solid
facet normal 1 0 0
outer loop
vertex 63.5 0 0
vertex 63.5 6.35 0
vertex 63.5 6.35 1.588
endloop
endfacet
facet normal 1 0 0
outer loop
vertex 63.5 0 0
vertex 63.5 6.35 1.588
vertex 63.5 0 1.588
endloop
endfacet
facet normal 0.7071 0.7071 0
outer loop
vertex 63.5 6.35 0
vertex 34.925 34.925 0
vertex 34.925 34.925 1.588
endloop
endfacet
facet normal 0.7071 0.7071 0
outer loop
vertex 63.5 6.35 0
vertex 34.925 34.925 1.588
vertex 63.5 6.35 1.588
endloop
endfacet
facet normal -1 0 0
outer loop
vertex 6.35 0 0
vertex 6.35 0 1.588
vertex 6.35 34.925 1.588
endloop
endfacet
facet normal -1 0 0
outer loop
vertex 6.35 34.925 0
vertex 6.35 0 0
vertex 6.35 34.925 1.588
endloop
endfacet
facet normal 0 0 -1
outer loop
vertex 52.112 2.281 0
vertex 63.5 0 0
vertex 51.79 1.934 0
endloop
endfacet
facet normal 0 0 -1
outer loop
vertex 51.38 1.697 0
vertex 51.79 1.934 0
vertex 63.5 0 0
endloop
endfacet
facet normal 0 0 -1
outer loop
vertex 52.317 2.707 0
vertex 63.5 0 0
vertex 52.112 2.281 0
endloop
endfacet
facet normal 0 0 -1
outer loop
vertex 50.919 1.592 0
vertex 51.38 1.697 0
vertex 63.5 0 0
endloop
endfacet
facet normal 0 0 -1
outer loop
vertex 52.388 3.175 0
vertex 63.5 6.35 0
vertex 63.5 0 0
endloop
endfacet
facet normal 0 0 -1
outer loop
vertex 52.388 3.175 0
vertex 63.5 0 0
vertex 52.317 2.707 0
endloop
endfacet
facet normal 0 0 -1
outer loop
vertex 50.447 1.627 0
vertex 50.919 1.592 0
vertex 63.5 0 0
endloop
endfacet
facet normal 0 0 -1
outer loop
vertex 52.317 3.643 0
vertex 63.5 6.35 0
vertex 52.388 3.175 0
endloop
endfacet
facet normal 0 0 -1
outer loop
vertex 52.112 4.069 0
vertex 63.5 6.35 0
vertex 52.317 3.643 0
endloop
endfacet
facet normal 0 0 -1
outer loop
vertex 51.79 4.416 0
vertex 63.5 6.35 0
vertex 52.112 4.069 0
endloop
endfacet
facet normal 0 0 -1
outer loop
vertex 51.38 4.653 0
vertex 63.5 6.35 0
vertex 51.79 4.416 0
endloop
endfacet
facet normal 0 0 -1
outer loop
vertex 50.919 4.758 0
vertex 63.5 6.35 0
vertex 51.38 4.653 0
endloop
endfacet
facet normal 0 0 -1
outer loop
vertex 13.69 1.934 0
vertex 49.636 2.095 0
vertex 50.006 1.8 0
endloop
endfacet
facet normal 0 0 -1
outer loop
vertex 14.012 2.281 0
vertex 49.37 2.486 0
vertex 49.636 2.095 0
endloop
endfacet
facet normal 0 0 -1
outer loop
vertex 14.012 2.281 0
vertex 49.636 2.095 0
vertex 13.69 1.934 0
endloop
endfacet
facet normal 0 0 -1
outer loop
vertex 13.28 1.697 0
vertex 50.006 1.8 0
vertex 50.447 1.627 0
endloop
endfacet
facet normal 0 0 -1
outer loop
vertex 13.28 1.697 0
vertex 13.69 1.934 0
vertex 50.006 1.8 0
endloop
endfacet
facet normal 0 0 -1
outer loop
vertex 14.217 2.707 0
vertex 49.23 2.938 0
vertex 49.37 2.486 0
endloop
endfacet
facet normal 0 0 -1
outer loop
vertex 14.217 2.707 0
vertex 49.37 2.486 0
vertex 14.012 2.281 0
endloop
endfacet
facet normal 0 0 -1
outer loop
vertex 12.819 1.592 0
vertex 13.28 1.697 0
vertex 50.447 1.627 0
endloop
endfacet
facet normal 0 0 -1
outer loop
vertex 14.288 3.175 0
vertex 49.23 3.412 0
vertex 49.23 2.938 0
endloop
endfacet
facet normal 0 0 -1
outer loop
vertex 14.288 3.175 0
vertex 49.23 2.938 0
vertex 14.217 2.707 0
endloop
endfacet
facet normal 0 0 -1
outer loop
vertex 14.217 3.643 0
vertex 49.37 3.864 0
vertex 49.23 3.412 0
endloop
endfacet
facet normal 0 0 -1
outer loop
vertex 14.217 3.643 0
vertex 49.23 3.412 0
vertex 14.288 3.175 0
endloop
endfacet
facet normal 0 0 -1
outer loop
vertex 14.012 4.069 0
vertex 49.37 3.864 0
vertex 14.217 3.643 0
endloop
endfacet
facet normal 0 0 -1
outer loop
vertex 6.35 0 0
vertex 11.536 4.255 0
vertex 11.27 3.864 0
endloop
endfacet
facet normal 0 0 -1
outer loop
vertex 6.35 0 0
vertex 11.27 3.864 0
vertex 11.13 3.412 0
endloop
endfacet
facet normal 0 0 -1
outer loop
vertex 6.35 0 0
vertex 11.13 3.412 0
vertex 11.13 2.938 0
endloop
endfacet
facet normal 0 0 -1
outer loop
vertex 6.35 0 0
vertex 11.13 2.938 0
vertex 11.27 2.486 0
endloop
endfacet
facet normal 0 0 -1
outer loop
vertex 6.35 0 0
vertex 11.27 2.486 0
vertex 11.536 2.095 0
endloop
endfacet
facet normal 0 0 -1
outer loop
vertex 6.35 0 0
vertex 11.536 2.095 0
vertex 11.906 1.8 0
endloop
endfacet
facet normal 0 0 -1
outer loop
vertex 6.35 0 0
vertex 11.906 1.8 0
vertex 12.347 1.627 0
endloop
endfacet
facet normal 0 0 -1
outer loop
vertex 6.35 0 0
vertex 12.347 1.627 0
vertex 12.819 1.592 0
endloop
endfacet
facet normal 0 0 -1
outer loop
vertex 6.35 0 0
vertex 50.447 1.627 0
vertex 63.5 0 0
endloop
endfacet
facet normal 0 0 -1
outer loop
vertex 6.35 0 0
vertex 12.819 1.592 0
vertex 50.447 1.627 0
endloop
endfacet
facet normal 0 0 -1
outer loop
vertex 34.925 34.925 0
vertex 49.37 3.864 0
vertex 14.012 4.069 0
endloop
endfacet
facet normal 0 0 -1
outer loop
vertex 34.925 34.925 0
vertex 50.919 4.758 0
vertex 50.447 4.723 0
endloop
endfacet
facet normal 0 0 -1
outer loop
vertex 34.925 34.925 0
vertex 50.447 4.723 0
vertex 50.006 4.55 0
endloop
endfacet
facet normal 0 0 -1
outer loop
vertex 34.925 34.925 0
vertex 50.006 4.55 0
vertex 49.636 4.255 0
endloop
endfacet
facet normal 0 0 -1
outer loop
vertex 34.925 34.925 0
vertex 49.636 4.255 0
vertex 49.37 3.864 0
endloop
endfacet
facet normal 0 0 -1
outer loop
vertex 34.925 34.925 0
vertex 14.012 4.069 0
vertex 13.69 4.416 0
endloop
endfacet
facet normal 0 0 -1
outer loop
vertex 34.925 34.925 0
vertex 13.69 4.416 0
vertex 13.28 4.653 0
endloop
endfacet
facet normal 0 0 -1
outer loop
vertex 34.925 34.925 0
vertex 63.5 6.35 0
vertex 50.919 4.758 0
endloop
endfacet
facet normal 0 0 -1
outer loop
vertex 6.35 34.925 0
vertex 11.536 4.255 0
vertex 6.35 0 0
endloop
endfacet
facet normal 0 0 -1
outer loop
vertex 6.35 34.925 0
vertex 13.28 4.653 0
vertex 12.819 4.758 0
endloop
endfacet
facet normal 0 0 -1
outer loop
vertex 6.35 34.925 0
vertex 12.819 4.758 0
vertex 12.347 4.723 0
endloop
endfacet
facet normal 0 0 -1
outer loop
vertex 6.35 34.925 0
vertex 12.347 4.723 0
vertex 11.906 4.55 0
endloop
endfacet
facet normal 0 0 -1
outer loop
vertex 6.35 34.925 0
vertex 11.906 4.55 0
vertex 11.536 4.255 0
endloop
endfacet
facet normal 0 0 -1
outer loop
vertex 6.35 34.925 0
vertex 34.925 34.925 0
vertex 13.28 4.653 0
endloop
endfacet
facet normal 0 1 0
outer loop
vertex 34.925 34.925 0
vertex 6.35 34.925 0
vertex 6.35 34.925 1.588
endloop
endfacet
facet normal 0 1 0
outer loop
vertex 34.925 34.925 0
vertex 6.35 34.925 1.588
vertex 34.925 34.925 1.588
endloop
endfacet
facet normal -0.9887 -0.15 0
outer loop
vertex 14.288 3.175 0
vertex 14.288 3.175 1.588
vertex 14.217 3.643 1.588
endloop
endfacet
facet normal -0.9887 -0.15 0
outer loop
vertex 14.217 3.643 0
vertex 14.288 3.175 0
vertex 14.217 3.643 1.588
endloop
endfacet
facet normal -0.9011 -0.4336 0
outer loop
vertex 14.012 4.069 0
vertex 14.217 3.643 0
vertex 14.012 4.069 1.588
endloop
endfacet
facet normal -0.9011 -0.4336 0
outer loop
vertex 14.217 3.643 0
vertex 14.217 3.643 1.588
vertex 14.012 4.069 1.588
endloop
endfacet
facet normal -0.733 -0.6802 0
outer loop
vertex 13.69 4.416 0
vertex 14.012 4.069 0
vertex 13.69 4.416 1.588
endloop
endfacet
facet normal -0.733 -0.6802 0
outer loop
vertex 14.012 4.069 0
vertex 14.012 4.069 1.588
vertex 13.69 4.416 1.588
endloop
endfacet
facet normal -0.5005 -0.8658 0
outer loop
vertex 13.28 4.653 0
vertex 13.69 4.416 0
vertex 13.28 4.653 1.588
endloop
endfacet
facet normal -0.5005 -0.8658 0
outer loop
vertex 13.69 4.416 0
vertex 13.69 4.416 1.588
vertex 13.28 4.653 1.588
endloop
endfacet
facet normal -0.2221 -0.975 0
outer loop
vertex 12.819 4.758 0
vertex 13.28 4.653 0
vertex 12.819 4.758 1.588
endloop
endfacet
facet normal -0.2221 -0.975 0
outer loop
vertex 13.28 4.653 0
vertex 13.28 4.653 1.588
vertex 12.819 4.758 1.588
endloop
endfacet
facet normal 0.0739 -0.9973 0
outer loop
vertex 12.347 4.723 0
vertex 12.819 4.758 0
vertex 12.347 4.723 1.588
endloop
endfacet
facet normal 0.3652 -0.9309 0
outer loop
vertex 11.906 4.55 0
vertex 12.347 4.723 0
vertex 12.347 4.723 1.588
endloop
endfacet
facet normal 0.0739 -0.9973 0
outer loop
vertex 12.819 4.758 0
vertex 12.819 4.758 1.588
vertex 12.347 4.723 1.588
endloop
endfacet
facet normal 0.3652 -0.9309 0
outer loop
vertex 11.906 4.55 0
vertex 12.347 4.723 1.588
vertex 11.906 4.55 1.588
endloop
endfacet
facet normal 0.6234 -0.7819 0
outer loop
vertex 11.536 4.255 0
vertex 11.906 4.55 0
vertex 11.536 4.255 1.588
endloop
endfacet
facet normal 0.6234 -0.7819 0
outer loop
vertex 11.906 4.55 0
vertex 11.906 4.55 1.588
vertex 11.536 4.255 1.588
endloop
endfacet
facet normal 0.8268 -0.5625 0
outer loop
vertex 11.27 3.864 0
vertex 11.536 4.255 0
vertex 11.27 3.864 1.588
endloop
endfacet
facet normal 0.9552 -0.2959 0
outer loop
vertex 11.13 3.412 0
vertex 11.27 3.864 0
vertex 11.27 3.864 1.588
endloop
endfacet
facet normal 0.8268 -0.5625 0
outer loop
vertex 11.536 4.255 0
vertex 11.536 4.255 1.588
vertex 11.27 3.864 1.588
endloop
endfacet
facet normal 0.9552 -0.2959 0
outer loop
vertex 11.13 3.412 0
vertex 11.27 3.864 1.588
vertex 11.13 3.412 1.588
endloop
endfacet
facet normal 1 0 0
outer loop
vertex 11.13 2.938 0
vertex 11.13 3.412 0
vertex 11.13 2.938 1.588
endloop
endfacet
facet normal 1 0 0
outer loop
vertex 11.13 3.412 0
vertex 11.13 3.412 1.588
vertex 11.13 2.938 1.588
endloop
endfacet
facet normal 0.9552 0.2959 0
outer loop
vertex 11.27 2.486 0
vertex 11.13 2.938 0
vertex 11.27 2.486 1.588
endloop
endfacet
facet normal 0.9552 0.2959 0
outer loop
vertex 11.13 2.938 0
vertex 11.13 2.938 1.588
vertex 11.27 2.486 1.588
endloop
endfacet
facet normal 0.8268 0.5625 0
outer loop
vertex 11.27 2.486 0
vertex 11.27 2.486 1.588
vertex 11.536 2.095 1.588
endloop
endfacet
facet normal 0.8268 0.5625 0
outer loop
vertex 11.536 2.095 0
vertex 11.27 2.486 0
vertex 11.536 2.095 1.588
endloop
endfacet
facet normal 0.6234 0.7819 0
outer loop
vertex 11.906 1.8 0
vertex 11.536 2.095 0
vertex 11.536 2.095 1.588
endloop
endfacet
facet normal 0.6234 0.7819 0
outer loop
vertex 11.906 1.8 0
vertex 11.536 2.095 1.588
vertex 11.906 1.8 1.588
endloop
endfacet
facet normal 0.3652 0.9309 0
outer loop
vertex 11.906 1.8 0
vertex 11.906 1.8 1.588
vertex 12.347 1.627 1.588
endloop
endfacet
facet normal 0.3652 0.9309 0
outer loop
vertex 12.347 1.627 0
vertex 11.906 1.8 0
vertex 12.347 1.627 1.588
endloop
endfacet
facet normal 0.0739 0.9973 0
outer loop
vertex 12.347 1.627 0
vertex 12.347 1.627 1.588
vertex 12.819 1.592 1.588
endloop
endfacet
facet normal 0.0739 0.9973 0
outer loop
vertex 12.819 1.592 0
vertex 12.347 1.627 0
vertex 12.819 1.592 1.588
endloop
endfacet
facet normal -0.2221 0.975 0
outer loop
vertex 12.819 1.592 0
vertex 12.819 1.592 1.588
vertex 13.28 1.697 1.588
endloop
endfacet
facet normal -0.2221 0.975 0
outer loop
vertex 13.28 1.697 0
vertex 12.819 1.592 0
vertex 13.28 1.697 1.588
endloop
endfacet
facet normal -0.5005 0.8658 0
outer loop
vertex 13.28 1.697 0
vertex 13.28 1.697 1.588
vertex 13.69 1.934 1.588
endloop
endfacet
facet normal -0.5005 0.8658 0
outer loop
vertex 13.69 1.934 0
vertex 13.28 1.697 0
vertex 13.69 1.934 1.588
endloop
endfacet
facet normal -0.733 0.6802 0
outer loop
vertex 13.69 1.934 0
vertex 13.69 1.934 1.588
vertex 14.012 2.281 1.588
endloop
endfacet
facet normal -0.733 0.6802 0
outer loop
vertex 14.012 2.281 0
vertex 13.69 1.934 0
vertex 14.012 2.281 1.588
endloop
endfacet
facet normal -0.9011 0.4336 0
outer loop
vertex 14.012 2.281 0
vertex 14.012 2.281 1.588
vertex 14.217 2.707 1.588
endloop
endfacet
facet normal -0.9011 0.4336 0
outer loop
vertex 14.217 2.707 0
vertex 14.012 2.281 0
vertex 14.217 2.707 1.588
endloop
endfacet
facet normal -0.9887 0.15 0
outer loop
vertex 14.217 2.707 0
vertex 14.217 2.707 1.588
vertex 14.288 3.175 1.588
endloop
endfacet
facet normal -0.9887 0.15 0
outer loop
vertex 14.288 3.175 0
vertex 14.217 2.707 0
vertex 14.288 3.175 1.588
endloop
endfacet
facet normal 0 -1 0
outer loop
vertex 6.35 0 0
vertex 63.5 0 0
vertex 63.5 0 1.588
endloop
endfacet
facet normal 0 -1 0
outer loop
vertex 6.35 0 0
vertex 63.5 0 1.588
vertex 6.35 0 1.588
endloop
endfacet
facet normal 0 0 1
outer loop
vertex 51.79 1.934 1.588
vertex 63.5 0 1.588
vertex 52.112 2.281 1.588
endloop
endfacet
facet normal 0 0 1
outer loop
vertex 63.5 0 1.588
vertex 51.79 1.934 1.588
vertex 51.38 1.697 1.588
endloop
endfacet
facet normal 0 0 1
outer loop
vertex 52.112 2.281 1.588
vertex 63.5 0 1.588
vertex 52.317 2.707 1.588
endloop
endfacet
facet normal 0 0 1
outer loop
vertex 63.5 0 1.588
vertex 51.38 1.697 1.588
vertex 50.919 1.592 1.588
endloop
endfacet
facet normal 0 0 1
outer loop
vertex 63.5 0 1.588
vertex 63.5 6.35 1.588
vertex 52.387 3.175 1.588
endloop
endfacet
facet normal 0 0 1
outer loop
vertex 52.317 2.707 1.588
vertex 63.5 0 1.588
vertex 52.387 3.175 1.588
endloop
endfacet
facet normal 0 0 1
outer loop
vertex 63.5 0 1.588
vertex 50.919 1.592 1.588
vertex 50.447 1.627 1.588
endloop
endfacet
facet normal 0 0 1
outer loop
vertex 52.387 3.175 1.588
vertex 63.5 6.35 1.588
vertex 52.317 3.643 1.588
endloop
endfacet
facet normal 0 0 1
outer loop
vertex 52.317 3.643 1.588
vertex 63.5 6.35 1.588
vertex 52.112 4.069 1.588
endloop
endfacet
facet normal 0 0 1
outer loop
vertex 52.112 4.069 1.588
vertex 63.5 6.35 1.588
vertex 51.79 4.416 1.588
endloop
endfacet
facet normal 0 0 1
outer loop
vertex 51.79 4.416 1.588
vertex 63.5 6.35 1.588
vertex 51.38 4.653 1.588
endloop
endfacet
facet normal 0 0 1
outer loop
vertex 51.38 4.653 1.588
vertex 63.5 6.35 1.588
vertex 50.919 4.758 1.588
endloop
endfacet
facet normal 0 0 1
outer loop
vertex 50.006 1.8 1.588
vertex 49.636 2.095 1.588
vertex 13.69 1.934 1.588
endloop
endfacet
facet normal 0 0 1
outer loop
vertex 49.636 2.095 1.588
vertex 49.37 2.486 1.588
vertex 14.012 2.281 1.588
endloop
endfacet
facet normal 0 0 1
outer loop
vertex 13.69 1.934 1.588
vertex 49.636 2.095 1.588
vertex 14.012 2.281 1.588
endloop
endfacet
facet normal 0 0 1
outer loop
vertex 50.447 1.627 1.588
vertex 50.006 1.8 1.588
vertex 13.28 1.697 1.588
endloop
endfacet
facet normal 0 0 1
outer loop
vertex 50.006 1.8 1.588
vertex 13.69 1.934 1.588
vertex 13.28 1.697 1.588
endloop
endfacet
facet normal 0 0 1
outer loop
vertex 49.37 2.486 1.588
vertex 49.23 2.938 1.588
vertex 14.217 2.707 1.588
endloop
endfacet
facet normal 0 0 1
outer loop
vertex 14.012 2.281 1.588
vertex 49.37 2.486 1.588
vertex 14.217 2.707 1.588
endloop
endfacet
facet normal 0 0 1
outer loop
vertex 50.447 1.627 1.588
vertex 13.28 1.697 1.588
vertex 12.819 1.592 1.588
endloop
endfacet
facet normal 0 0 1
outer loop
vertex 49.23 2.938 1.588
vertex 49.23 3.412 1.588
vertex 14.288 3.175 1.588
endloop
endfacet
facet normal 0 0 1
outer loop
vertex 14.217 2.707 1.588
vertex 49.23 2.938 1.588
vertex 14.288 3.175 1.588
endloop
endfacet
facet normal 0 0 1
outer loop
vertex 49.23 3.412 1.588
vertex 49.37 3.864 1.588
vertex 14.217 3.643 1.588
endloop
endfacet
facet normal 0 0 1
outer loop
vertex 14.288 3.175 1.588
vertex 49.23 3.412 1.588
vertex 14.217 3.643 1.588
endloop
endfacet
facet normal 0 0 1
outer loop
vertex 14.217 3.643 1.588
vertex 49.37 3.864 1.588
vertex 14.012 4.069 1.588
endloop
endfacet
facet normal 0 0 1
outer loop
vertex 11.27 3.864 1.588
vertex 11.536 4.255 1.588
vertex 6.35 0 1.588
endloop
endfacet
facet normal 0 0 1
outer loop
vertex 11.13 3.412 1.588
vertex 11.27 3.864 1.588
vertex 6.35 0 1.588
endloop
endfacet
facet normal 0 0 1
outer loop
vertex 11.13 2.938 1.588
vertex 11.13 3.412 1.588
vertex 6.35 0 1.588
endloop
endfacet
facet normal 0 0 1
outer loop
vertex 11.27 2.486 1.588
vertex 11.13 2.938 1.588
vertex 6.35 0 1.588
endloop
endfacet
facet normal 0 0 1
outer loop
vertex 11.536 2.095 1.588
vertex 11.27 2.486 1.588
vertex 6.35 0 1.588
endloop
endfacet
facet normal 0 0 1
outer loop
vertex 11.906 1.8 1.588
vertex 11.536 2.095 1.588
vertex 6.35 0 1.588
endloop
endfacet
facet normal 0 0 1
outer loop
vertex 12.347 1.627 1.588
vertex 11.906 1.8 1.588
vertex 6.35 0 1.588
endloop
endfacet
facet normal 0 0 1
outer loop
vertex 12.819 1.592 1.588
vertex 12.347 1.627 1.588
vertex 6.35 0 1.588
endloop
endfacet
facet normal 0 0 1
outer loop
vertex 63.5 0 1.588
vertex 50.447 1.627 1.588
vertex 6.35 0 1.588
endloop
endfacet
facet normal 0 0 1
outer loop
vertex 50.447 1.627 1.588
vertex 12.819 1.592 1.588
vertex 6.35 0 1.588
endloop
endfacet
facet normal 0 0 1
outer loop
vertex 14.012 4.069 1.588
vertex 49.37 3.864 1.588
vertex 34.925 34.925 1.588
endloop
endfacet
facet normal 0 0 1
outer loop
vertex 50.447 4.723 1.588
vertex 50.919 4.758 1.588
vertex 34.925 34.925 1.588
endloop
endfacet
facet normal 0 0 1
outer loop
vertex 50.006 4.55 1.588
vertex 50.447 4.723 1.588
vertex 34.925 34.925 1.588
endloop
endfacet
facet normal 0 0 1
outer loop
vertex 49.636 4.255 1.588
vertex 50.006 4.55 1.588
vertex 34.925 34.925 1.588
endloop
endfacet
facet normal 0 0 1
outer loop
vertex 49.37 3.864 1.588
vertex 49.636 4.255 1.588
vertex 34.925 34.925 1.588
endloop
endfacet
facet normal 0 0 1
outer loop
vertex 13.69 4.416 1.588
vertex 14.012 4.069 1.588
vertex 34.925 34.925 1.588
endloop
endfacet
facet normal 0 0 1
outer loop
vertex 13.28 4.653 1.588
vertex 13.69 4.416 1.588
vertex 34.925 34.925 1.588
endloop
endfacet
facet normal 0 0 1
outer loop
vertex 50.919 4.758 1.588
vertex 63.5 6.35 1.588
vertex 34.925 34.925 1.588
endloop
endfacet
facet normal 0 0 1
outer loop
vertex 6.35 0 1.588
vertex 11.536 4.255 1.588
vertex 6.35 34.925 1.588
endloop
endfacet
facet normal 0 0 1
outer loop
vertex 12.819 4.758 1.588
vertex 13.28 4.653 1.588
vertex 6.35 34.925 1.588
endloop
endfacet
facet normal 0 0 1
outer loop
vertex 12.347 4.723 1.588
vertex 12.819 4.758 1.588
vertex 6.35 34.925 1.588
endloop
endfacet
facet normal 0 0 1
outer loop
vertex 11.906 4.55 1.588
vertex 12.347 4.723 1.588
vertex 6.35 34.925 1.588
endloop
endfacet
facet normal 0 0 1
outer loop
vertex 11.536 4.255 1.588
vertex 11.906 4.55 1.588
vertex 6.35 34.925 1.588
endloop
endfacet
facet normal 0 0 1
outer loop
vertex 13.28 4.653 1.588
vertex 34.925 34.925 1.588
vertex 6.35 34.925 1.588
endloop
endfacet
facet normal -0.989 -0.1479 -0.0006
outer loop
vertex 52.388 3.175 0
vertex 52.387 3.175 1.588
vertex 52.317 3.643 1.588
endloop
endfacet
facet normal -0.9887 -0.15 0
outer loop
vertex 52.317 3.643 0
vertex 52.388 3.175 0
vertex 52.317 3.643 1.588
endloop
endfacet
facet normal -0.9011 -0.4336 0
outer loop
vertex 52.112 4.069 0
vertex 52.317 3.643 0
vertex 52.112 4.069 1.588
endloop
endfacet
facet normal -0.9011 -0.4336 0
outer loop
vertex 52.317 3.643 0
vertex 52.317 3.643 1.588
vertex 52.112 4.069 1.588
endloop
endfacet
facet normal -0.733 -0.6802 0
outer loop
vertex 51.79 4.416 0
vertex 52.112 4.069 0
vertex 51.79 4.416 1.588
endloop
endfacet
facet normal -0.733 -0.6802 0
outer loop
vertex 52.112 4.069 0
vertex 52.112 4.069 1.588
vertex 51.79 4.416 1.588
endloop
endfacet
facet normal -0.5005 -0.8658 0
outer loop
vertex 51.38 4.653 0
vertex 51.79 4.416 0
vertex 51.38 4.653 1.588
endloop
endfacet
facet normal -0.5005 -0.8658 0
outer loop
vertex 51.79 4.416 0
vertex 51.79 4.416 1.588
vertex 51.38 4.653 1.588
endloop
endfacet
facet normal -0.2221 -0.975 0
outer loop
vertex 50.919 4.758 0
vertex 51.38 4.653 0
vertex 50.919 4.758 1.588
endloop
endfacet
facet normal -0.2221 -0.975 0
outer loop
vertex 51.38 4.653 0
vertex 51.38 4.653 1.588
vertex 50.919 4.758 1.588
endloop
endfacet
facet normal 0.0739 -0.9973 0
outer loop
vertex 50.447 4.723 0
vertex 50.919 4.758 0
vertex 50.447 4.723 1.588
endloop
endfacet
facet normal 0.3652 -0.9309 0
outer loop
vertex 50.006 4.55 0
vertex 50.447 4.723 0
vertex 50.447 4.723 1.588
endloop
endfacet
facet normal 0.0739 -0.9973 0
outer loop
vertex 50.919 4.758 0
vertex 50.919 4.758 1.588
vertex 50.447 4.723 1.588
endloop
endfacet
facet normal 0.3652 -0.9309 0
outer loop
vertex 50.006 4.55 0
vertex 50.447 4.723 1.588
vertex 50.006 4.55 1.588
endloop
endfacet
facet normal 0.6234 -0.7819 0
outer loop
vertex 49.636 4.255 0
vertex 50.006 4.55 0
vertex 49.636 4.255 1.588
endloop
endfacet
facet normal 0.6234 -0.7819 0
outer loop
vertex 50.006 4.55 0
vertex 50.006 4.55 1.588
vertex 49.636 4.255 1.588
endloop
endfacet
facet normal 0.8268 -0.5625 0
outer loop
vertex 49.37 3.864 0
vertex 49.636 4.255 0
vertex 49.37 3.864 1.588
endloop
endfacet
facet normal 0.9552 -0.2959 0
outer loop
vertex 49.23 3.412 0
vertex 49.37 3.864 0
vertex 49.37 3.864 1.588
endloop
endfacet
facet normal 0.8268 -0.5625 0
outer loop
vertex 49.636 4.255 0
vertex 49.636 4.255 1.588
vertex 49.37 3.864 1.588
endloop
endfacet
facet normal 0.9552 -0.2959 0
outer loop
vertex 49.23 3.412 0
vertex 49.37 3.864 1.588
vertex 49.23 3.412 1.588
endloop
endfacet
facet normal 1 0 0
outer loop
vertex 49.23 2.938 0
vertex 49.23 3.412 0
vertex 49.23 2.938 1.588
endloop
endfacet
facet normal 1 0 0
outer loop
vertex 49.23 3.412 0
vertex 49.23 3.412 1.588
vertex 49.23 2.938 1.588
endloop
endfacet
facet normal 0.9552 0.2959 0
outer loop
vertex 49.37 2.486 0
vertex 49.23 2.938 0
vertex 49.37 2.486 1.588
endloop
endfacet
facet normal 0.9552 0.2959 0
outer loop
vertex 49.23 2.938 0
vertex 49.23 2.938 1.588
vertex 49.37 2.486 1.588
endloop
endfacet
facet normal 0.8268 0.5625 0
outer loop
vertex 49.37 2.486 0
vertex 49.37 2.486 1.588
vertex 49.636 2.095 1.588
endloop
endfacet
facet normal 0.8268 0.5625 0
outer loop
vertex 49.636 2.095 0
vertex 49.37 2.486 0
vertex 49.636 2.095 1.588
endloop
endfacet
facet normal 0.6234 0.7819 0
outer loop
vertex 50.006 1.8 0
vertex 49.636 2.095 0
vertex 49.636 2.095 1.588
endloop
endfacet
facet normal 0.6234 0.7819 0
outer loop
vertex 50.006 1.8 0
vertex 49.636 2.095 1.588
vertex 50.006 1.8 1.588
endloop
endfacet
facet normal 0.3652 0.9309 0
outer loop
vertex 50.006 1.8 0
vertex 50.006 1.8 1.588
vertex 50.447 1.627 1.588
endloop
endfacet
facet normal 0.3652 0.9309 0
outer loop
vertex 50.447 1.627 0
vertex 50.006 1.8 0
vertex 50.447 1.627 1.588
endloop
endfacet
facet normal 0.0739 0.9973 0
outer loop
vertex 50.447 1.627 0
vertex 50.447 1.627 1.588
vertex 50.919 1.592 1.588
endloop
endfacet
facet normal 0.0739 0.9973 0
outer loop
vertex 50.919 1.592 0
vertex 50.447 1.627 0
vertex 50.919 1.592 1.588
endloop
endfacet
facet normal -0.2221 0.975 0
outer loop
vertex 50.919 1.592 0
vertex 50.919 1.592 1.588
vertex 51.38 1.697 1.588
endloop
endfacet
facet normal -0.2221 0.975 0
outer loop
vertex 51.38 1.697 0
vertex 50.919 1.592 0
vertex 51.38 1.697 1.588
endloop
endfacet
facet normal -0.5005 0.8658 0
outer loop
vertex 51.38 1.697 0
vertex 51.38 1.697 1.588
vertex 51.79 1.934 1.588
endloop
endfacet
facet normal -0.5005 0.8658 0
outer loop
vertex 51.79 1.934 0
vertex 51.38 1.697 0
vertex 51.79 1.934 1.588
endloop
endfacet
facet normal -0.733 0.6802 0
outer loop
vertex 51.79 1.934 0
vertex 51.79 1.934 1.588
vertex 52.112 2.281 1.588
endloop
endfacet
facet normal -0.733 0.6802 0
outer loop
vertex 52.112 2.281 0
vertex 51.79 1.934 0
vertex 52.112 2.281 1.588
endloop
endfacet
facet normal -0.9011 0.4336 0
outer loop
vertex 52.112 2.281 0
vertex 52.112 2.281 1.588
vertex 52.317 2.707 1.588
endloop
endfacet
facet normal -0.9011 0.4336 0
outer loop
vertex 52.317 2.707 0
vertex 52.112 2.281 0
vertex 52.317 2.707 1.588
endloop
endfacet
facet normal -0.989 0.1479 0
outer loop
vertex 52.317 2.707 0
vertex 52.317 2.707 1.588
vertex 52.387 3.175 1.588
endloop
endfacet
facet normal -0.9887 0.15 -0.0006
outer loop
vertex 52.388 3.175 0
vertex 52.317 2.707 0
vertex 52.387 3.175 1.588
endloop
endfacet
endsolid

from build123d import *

# Parameters (mm, degrees)
BOSS_EXTRUDE1_DEPTH = 1.5875
SKETCH2_R           = 1.5875
CUT_EXTRUDE1_DEPTH  = 2.54
LPATTERN2_COUNT     = 2
LPATTERN2_PITCH     = 38.1
SKETCH3_W           = 6.35
SKETCH3_H           = 34.925
CUT_EXTRUDE2_DEPTH  = 2.54


with BuildPart() as part:
    # Sketch1 → Boss-Extrude1 (new body)
    with BuildSketch(Plane.XY):
        Polygon((0, 0), (0, 34.925), (34.925, 34.925), (63.5, 6.35), (63.5, 0), align=None)
    extrude(amount=BOSS_EXTRUDE1_DEPTH)

    # Sketch2 → Cut-Extrude1 (cut)
    with BuildSketch(Plane.XY.offset(1.5875)):
        with Locations((12.7, 3.175)):
            Circle(SKETCH2_R)
    cut_extrude1 = extrude(amount=-CUT_EXTRUDE1_DEPTH, mode=Mode.SUBTRACT)

    # LPattern2: Cut-Extrude1 ×2
    with Locations(*[(i * LPATTERN2_PITCH, 0, 0) for i in range(1, LPATTERN2_COUNT)]):
        add(cut_extrude1, mode=Mode.SUBTRACT)

    # Sketch3 → Cut-Extrude2 (cut)
    with BuildSketch(Plane.XY.offset(1.5875)):
        with Locations((3.175, 17.4625)):
            Rectangle(SKETCH3_W, SKETCH3_H)
    extrude(amount=-CUT_EXTRUDE2_DEPTH, mode=Mode.SUBTRACT)


solid = part.part
